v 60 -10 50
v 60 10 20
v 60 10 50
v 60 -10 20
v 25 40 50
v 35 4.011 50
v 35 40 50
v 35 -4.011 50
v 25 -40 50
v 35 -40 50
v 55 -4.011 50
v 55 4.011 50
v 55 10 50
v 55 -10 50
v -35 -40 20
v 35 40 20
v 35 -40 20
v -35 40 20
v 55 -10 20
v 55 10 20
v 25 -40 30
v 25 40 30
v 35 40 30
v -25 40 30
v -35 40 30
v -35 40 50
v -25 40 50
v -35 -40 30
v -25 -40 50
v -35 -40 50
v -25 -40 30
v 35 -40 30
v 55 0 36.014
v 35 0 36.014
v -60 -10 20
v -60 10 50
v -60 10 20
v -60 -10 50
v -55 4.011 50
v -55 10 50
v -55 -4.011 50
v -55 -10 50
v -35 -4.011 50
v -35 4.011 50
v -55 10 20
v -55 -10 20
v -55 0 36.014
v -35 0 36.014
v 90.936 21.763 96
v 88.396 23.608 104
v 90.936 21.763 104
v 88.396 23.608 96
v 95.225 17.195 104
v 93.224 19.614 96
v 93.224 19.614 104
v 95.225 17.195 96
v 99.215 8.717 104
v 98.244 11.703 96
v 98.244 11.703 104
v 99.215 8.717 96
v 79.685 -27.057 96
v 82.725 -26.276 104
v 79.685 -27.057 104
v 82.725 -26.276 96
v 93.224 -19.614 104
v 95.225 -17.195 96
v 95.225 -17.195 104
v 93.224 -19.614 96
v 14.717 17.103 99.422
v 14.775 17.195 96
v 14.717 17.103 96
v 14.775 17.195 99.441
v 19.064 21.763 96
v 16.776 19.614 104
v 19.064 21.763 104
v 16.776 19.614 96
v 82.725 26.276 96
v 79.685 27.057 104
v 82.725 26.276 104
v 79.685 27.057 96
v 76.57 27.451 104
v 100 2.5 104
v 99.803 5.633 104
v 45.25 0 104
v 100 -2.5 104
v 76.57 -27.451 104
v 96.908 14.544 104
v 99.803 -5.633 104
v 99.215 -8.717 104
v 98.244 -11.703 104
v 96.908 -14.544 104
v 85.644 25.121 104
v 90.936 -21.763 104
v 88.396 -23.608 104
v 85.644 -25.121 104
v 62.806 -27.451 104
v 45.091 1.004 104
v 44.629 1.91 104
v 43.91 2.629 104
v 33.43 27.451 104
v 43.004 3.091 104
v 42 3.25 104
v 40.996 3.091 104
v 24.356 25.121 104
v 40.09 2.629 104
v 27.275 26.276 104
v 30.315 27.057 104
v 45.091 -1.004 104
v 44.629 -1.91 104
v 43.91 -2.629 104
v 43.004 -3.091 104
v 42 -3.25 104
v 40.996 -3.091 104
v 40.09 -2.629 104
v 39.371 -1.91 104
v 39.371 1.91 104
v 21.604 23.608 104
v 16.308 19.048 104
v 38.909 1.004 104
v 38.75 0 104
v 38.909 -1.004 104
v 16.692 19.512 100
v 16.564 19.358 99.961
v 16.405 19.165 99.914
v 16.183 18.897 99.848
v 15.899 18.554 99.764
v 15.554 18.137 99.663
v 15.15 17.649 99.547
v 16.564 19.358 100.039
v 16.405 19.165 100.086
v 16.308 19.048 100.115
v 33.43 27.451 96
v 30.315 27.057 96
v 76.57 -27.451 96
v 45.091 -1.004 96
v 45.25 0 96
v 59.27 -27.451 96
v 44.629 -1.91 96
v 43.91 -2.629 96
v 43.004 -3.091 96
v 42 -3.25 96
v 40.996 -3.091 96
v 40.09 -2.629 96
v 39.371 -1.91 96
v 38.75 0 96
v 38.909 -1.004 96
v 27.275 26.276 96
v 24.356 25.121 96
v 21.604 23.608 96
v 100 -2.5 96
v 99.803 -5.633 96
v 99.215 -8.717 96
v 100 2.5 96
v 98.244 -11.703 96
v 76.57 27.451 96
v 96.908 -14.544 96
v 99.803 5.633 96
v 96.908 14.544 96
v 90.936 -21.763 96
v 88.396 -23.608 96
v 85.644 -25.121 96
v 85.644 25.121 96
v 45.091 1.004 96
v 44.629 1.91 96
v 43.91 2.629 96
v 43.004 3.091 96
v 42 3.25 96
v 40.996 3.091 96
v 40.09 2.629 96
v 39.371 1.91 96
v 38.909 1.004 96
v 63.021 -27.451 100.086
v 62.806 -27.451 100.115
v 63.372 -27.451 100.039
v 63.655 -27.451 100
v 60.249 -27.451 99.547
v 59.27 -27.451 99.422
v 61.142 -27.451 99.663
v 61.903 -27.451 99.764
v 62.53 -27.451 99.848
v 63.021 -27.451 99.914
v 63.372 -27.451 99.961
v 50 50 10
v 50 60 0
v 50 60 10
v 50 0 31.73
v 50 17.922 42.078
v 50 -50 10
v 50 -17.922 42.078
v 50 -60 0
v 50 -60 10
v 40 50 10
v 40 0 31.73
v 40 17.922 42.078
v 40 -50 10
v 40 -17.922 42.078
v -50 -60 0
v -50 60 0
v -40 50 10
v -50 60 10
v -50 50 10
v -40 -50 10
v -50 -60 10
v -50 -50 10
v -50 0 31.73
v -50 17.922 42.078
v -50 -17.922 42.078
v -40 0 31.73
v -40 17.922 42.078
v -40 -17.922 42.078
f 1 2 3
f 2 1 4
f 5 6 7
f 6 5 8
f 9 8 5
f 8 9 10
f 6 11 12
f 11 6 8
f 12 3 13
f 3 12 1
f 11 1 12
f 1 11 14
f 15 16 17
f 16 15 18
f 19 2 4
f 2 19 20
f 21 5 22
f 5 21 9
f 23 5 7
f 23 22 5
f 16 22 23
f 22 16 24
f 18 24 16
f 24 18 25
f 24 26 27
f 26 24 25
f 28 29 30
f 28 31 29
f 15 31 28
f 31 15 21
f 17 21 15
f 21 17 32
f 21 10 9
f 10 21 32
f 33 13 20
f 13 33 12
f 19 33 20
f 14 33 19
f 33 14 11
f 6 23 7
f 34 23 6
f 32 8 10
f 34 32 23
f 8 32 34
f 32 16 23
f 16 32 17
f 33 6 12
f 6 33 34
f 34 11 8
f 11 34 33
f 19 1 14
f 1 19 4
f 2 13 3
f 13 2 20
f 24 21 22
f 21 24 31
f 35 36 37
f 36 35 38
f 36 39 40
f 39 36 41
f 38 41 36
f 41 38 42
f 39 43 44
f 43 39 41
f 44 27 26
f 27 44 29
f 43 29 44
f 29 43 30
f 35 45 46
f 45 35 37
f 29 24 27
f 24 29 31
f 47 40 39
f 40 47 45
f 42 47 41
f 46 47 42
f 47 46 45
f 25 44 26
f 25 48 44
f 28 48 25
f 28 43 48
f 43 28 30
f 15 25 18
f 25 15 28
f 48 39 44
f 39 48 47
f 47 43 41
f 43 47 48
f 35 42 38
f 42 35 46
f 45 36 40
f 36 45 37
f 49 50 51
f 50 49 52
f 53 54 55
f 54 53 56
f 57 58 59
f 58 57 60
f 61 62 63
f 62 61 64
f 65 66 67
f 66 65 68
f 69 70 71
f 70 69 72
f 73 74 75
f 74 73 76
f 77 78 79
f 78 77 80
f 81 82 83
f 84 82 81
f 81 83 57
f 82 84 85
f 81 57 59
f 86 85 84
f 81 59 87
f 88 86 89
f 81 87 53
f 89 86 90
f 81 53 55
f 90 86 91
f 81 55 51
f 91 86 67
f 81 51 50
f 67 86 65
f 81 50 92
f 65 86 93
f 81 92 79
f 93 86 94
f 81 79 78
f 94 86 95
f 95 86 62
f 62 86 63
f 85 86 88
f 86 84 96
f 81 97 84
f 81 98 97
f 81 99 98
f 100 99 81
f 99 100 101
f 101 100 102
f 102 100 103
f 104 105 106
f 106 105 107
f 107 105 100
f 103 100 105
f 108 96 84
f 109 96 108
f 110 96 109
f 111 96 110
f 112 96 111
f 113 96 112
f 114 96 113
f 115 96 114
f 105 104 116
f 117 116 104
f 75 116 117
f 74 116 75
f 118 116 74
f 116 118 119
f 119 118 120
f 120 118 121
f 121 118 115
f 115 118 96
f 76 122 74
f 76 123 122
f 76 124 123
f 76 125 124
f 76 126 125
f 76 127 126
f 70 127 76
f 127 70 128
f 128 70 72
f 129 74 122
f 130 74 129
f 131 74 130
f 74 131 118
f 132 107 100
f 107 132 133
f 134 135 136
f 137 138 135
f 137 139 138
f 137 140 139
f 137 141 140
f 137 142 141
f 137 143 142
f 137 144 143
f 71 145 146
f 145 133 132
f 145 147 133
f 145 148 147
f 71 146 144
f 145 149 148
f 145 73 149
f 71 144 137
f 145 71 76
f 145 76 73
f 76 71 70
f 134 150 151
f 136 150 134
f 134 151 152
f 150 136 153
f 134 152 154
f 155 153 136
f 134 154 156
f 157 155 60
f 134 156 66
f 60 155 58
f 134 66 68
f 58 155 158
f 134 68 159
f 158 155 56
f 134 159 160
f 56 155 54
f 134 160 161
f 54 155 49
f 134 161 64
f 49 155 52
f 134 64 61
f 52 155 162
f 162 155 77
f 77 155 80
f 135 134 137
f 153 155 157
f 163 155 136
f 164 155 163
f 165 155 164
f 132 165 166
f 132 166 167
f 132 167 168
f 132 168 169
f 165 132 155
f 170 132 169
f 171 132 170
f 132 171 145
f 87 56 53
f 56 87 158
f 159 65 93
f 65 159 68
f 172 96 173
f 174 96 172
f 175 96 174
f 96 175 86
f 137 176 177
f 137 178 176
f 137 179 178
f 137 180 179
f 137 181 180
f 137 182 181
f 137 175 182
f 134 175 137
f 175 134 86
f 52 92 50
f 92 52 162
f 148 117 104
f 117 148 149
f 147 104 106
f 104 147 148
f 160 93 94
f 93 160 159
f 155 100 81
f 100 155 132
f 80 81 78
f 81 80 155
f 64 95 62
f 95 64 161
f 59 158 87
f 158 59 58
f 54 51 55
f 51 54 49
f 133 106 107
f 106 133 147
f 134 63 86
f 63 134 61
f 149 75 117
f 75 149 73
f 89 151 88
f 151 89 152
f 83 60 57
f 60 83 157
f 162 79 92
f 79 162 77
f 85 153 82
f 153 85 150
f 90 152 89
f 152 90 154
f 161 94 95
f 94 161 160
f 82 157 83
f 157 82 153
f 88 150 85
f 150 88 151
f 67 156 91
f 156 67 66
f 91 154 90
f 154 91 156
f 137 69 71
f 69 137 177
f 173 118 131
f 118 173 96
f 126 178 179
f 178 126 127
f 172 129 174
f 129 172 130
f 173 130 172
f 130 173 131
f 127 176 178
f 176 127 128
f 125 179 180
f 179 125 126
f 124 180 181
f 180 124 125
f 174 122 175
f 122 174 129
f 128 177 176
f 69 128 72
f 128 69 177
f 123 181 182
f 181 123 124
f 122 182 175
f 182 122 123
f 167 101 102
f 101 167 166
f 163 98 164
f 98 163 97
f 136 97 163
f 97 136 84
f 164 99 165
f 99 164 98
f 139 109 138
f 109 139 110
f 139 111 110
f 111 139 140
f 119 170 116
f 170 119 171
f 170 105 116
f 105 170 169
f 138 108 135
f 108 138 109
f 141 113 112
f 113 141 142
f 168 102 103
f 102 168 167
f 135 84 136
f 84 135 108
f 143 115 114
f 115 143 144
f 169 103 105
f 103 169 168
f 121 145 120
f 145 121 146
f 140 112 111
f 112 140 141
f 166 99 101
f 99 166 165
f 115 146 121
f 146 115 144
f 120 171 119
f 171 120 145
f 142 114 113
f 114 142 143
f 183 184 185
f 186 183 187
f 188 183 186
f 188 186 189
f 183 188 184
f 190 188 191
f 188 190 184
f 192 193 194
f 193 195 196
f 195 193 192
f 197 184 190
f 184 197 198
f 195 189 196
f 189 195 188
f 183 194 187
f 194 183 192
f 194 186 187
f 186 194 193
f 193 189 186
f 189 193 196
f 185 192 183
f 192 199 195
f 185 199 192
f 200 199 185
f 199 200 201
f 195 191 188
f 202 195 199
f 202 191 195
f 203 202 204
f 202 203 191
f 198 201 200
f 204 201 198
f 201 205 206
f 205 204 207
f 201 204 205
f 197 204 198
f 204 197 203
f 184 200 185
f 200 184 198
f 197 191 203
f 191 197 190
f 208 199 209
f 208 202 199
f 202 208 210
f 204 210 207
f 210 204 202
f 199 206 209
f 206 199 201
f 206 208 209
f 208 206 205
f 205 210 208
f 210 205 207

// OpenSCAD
// file: lib/naca4.scad
// Naca4.scad - library for parametric airfoils of 4 digit NACA series
// Code: Rudolf Huttary, Berlin 
// June 2015
// commercial use prohibited


// general use: for more examples refer to sampler.scad
// naca = naca digits or 3el vector  (default = 12 or [0, 0, .12])
// L    = chord length [mm]      (default= 100)
// N    = # sample points        (default= 81)
// h    = height [mm]            (default= 1)
// open = close at the thin end? (default = true)
// two equivalent example calls
 airfoil(naca = 2408, L = 60, N=1001, h = 30, open = false); 
// airfoil(naca = [.2, .4, .32], L = 60, N=1001, h = 30, open = false); 

module help()
{
  echo(str("\n\nList of signatures in lib:\n=================\n", 
  "module airfoil(naca=2412, L = 100, N = 81, h = 1, open = false) - renders airfoil object\n", 
  "module airfoil(naca=[.2, .4, .12], L = 100, N = 81, h = 1, open = false) - renders airfoil object using percentage for camber,  camber distance and thicknes\n", 
  "function airfoil_data(naca=12, L = 100, N = 81, open = false)\n",
  "=================\n")); 
}

help(); 
// this is the object
module airfoil(naca=12, L = 100, N = 81, h = 1, open = false)
{
  linear_extrude(height = h)
  polygon(points = airfoil_data(naca, L, N, open)); 
}

module hollow_airfoil(lnaca=12, L = 100, N = 81, h = 1, open = false, wall_thickness = 1)
{
    if (open){
        linear_extrude(height = h)
            difference(){
                polygon(points = airfoil_data(naca, L, N, false));
                offset(delta = - wall_thickness, chamfer = false) polygon(points = airfoil_data(naca, L, N, open = false));
            }
    }
    else{

        linear_extrude(height = wall_thickness)
            polygon(points = airfoil_data(naca, L, N, false)); 

        linear_extrude(height = h)
            difference(){
                polygon(points = airfoil_data(naca, L, N, open));
                offset(delta = - wall_thickness) polygon(points = airfoil_data(naca, L, N, open = false));
            }

        translate([0,0, h - wall_thickness])
            linear_extrude(height = wall_thickness)
                polygon(points = airfoil_data(naca, L, N, false)); 

    }
}


// this is the main function providing the airfoil data
function airfoil_data(naca=12, L = 100, N = 81, open = false) = 
  let(Na = len(naca)!=3?NACA(naca):naca)
  let(A = [.2969, -0.126, -.3516, .2843, open?-0.1015:-0.1036])
  [for (b=[-180:360/(N):179.99]) 
    let (x = (1-cos(b))/2)  
    let(yt = sign(b)*Na[2]/.2*(A*[sqrt(x), x, x*x, x*x*x, x*x*x*x])) 
    Na[0]==0?L*[x, yt]:L*camber(x, yt, Na[0], Na[1], sign(b))];  


function trailing_edge_angle(naca=12, open = false) = 
  let(Na = len(naca)!=3?NACA(naca):naca)
  let(A = [.2969, -0.126, -.3516, .2843, open?-0.1015:-0.1036])
  let (x =0.999)  // set x near to airfoil trailing edge
  let(yt = Na[2]/.2*(A*[sqrt(x), x, x*x, x*x*x, x*x*x*x])) // calculate distance from x-axis at previously set position
  atan2(yt,1-x);  // calculate angle of triangle between end of airfoil. The triange height corresponds to previously calculated distance from x-axis

function surface_angle(x = 0.5, naca=12, open = false) = 
  let(Na = len(naca)!=3?NACA(naca):naca)
  let(A = [0.2969, -0.126, -0.3516, 0.2843, open?-0.1015:-0.1036])
  let(dy = Na[2]/0.2*(A*[(1/2)*(1/sqrt(x)), 1, 2*x, 3*x*x, 4*x*x*x])) // calculate derivative of airfoil function at the x point
  atan(dy);  // calculate  the angle from function derivative

function surface_distance(x = 0.5, naca=12, open = false) = 
  let(Na = len(naca)!=3?NACA(naca):naca)
  let(A = [0.2969, -0.126, -0.3516, 0.2843, open?-0.1015:-0.1036])
  Na[2]/.2*(A*[sqrt(x), x, x*x, x*x*x, x*x*x*x]); // calculate distance from x-axis at previously set position

// helper functions
function NACA(naca) = 
  let (M = floor(naca/1000))
  let (P = floor((naca-M*1000)/100)) 
  [M/100, P/10, floor(naca-M*1000-P*100)/100];  

function camber(x, y, M, P, upper) = 
  let(yc = (x<P)?M/P/P*(2*P*x-x*x): M/(1-P)/(1-P)*(1 - 2*P + 2*P*x -x*x))
  let(dy = (x<P)?2*M/P/P*(P-x):2*M/(1-P)/(1-P)*(P-x))
  let(th = atan(dy))
  [upper ? x - y*sin(th):x + y*sin(th), upper ? yc + y*cos(th):yc - y*cos(th)];
// file: ../Parameters.scad
//Main tube diameter - hole [mm]
main_tube_outer_diameter = 25.4;
main_tube_inner_diameter = 23.5;

//Tube for undercarriage - hole [mm]
tube_for_undercarriage_outer_diameter = 10.6;
tube_for_undercarriage_inner_diameter = 6;
global_clearance = 0.5;


//umístění podvozkových trubek

second_undercarriage_hole = main_tube_outer_diameter*2 + main_tube_outer_diameter/5 + main_tube_outer_diameter/2 + 170 + 160;

// Parameters of tube couplings
coupling_wall_thickness = main_tube_outer_diameter/5;  //width of coupling walls 
thickness_between_tubes = main_tube_outer_diameter/10;    // minimum distance between tubes in couplings

coupling_wall_thickness_undercarriage = tube_for_undercarriage_outer_diameter/3;
thickness_between_tubes_undercarriage = tube_for_undercarriage_outer_diameter/10;

//Screw diameter and nut for M4 [mm]
M4_screw_diameter=4.5;
Nut_height_M4 = 3.2;
Nut_diameter_M4 = 8.4;


//Screw diameter and nut for M3 [mm]
M3_screw_diameter = 3.2;
Nut_height_M3 = 2.7;	
Nut_diameter_M3 = 6.6; 


//The tube for help
Help_main_tube_outer = 25;
Help_main_tube_inner = 23; 
Help_tube_for_undercarriage_outer = 10;
Help_tube_for_undercarriage_inner = 5;


//main hull parameters

hull_drop_length = 580;
hull_wall_thickness = 0.8;
hull_y_size = 120;
hull_z_size = 150;
hull_x_size = 580;
hull_corner_radius = 4;
hull_airfoil_thickness= 35;  // thickness of drop generating airfoil in percent of lenght.
hull_scale_x = 1;
hull_scale_y = 1.5;
hull_scale_z = 1.5;

main_pilon_position = 170+68;
cover_pilon_position = 180;
height_of_vertical_tube = 275; //278mm je změřená délka trubky. 

//délka hlavní dlouhé trubky
length_of_main_tube = 920;
length_of_undercarriage_tube = 300;

ribbon_width = 5; // šířka vyztužovacích lemů. 

// šířka otvoru v přední části kapoty pro držák motoru.
width_of_engine_holder = 63;

//Top Cover Division - dělení horního krytu pro tisk
top_cover_division = [0, 50, 150, 280, 410, hull_x_size]; // upraveny seznam tak, aby deleni začinalo od nuly, což umožňí úplně automatické rozdělení.

//Bottom Cover Division - dělení dolního krytu pro tisk
bottom_cover_division = [0,100,232.5,365, 470, hull_x_size];
// zkrácená část pro payload pro testovací tisk
//bottom_cover_division = [0,200,250,365, 470, hull_x_size];

//Base Divison - dělení podložky
base_division = [0, 140, main_pilon_position - (3*main_tube_outer_diameter)/2 + 3 * main_tube_outer_diameter,second_undercarriage_hole - main_tube_outer_diameter/2 - coupling_wall_thickness + main_tube_outer_diameter+2*(main_tube_outer_diameter/5) + global_clearance, hull_x_size];

//Cover pilon division - na výšku (v ose Z)
cover_pilon_division = [0,170,height_of_vertical_tube + main_tube_outer_diameter + coupling_wall_thickness];

//pozice šroubů
	//horní kryt
top_screw_position = [0,
                    (top_cover_division[0] + top_cover_division[1])/2,
                    (top_cover_division[2] - top_cover_division[1])/2 + top_cover_division[1],
                    (top_cover_division[3] - top_cover_division[2])/2 + top_cover_division[2],
                    (top_cover_division[4] - top_cover_division[3])/8 + top_cover_division[3],
                    (top_cover_division[5] - top_cover_division[4])/2 + top_cover_division[4] - top_cover_division[1]/3];
	//spodní kryt
bottom_screw_position = [0,
                        (bottom_cover_division[0] + bottom_cover_division[1])*(2/6), 
                        bottom_cover_division[1]*(9/10), 
                        bottom_cover_division[3] + bottom_cover_division[1]*(1/10), 
                        bottom_cover_division[3] + bottom_cover_division[1]*(3/5)];




//šířka zámků
lock_width = 10;

//délka zámků
lock_length = 3;


//accumulator
//základní rozměry akumulátoru
width_of_accumulator = 129.4;//45+1;
depth_of_accumulator = 40.61;
height_of_accumulator = 43.65;
//Zapuštění akumulátoru
sink_of_accumulator = 5; //main_tube_outer_diameter/5 - Nut_height_M3*1.5;

//tloušťka hrany spojky
accumulator_holder_width = 18; 
accumulator_holder_thickness = 10; 

//posunutí akumálátoru na podložce
move_of_accumulator = 165;   // pozice akumulátoru (ovlivňuje těžiště)


////////////////
// Senzory
///////////////////

//opticalFlow
    width_optical_flow_senzor = 45.5;
    depth_optical_flow_senzor = 6;
    height_optical_flow_senzor = 35;
    sink_of_optical_flow_senzor = depth_optical_flow_senzor - 5; 
    M3_optical_flow_senzor_Z = 30.4;
    M3_optical_flow_senzor_X = 24;
    M3_optical_flow_senzor_Z_alone = 9.1;
    M3_optical_flow_senzor_X_alone = 16.7;

//GPS anténa
GPS_outer_length = 48.01;   //Vnější rozměr
GPS_inner_length = 37.48;   //Vnitřní rozměr
GPS_diameter = (GPS_outer_length - GPS_inner_length)/2;    //Průměr otvoru
GPS_middle_length = GPS_diameter + GPS_inner_length;      //Střední rozměr


////podzvozek

radius_undercarriage = 25;
vzdalenost_x = tan(20) * 131;
vzdalenost_y = (131 - radius_undercarriage)/tan(79);

maximum_printable_size = 150;


////Pitotova trubice
Pitot_tube_diameter = 4.02 + 1;
Distance_hole_from_tube = 11.92;  //vzdálenost otvoru pro připevnění od samotné trubičky


////směrové kormidlo
Rudder_length = 4*main_tube_outer_diameter;
Rudder_height = 2*main_tube_outer_diameter;
Rudder_depth = main_tube_outer_diameter/2;
gap_width = 2*hull_wall_thickness;      //šířka mezery mezi směrovkou a ocasní plochou
// main file
//vyvažovací přípravek


wall_thickness=10; 

module 888_1009_base_half(x_size = 100, y_size = 120, z_size = 20, thickness = 10){     //základna

    translate([-x_size/2,-y_size/2,0])
        cube([x_size/2,y_size,thickness], center = false);         //základní plocha
    
    //podpěra
    render()
    translate([x_size/2 - thickness,-y_size/2,0])
        rotate([90,0,90])           
            difference(){
                    cube([120,80,thickness]);          //základní plocha pro zkosení
                translate([0,0,-5])
                    rotate([0,0,45])
                        cube([120,120,20]);     //zkosení
                translate([120,0,-5])
                    rotate([0,0,45])
                        cube([120,120,20]);     //zkosení
                //vyskousnutí
                translate([60,31.73,-5])
                    rotate([0,0,30])
                        cube([40,40,20]);    
                translate([60,31.73,-5])
                    rotate([0,0,45+15])
                        cube([40,40,20]);       


            }

//final module základna
}



module 888_1009_base(){		//základna

    888_1009_base_half();
    mirror([1,0,0])
        888_1009_base_half();
}


module 888_1009_shape_A(x_size = 130, y_size = 60, z_size = 8){

    airfoil_NACA = 0016;    // typ použitého profilu
    airfoil_depth = 50; // hloubka profilu
    length = 200;       // celková délka polotovaru
    bridge_thickness = 0.6;  // tloušťka spojení mezi rotorovým listem a rámečkem
    airfoil_thickness = (airfoil_NACA/100) * (airfoil_depth + bridge_thickness); // vypočtená maximální tloušťka profilu

    render()
    difference(){
        //základní materiál
		color([0,0.5,0])
		translate ([160/2 - 25, 0, 0])
			minkowski(){
				cube([x_size/2-25,y_size/2 - 25,z_size-1], center = true);
	            cylinder(h = 1, r =  25, $fn = 50, center = true);
			}
        //otvor pro rotorový list
		rotate([0,0,45])
			cube([45,150,40], center = true);

        translate ([ 0, 0, 20])
			rotate([0,0,45])
				cube([50,150,40], center = true);

               
/*        rotate([0,0,45])
            666_1201(draft = true, holes = true);*/
        rotate([0,0,45])
            translate ([ -airfoil_depth/2, length/2, 0])
                rotate([90, 0, 0])
                    airfoil(naca = airfoil_NACA, L = airfoil_depth + bridge_thickness, N = 100, h = length, open = false);  

        //otvory pro šrouby
        translate([110/2 - x_size/10, 0, 0])
            cylinder(h = 10, d =  6.5, $fn = 20, center = true);
    }

/*    color([1,0.5,0])
        rotate([0,0,45])
            translate ([ -airfoil_depth/2, length/2, 0])
                rotate([90, 0, 0])
                    airfoil(naca = airfoil_NACA, L = airfoil_depth + bridge_thickness, N = 100, h = length, open = false);  
*/
}

module 888_1009_shape(x_size = 130, y_size = 60, z_size = 8){

    airfoil_NACA = 0016;    // typ použitého profilu
    airfoil_depth = 50; // hloubka profilu
    length = 200;       // celková délka polotovaru
    bridge_thickness = 0.6;  // tloušťka spojení mezi rotorovým listem a rámečkem
    airfoil_thickness = (airfoil_NACA/100) * (airfoil_depth + bridge_thickness); // vypočtená maximální tloušťka profilu

    render()
    difference(){
        //základní materiál
		color([0,0.5,0])
		minkowski(){
			cube([x_size/2-25,y_size/2 - 25,z_size], center = true);
            cylinder(h = 1, r =  25, $fn = 50, center = true);
		}
        //otvor pro rotorový list
		rotate([0,0,45])
			cube([45,150,40], center = true);
               
/*\        rotate([0,0,45])
            666_1201(draft = true, holes = true);*/
        rotate([0,0,45])
            translate ([ -airfoil_depth/2, length/2, 0])
                rotate([90, 0, 0])
                    airfoil(naca = airfoil_NACA, L = airfoil_depth + bridge_thickness, N = 100, h = length, open = false);  

        //otvory pro šrouby
        translate([110/2 - x_size/10, 0, 0])
            cylinder(h = 10, d =  6.5, $fn = 20, center = true);

        translate([-110/2, 0, 0])
            cylinder(h = 10, d =  6.5, $fn = 20, center = true);

    }

/*    color([1,0.5,0])
        rotate([0,0,45])
            translate ([ -airfoil_depth/2, length/2, 0])
                rotate([90, 0, 0])
                    airfoil(naca = airfoil_NACA, L = airfoil_depth + bridge_thickness, N = 100, h = length, open = false);  
*/



//final module tvar
}


module 888_1009_cradle_half(x_size = 100, y_size = 80, z_size = 20, thickness = 10){		//kolébka
	//základní deska
	translate([0,-y_size/2,0])
	color([0.5,0,0])
		cube([x_size/2 - wall_thickness*1.5,y_size,thickness]);


	difference(){
		translate([x_size/2 - wall_thickness*2.5,-y_size/2,0])
			color([0.5,0,0])
				cube([wall_thickness*3.5,80,wall_thickness*3]);
		
		translate([x_size/2 - wall_thickness/2,25,25/2])
			rotate([-16,0,0])
				cube([wall_thickness*2,50,50], center = true);

		translate([x_size/2 - wall_thickness/2,-25,25/2])
			rotate([16,0,0])
				cube([wall_thickness*2,50,50],center = true);

		// zůžení přesahující kostky
		translate([x_size/2,-25,25/2])
			cube([wall_thickness*2,30,50],center = true);

		translate([x_size/2,25,25/2])
			cube([wall_thickness*2,30,50],center = true);

	}
}


module 888_1009_cradle(x_size = 180, y_size = 80, z_size = 20, thickness = 10){		//kolébka

	888_1009_cradle_half();
    mirror([1,0,0])
        888_1009_cradle_half();
}


translate([0,0,20])
		888_1009_cradle();

translate([0,0,100])
		888_1009_shape_A();

		888_1009_base();


include <../Parameters.scad>
use <./lib/naca4.scad>
include <../Parameters.scad>
